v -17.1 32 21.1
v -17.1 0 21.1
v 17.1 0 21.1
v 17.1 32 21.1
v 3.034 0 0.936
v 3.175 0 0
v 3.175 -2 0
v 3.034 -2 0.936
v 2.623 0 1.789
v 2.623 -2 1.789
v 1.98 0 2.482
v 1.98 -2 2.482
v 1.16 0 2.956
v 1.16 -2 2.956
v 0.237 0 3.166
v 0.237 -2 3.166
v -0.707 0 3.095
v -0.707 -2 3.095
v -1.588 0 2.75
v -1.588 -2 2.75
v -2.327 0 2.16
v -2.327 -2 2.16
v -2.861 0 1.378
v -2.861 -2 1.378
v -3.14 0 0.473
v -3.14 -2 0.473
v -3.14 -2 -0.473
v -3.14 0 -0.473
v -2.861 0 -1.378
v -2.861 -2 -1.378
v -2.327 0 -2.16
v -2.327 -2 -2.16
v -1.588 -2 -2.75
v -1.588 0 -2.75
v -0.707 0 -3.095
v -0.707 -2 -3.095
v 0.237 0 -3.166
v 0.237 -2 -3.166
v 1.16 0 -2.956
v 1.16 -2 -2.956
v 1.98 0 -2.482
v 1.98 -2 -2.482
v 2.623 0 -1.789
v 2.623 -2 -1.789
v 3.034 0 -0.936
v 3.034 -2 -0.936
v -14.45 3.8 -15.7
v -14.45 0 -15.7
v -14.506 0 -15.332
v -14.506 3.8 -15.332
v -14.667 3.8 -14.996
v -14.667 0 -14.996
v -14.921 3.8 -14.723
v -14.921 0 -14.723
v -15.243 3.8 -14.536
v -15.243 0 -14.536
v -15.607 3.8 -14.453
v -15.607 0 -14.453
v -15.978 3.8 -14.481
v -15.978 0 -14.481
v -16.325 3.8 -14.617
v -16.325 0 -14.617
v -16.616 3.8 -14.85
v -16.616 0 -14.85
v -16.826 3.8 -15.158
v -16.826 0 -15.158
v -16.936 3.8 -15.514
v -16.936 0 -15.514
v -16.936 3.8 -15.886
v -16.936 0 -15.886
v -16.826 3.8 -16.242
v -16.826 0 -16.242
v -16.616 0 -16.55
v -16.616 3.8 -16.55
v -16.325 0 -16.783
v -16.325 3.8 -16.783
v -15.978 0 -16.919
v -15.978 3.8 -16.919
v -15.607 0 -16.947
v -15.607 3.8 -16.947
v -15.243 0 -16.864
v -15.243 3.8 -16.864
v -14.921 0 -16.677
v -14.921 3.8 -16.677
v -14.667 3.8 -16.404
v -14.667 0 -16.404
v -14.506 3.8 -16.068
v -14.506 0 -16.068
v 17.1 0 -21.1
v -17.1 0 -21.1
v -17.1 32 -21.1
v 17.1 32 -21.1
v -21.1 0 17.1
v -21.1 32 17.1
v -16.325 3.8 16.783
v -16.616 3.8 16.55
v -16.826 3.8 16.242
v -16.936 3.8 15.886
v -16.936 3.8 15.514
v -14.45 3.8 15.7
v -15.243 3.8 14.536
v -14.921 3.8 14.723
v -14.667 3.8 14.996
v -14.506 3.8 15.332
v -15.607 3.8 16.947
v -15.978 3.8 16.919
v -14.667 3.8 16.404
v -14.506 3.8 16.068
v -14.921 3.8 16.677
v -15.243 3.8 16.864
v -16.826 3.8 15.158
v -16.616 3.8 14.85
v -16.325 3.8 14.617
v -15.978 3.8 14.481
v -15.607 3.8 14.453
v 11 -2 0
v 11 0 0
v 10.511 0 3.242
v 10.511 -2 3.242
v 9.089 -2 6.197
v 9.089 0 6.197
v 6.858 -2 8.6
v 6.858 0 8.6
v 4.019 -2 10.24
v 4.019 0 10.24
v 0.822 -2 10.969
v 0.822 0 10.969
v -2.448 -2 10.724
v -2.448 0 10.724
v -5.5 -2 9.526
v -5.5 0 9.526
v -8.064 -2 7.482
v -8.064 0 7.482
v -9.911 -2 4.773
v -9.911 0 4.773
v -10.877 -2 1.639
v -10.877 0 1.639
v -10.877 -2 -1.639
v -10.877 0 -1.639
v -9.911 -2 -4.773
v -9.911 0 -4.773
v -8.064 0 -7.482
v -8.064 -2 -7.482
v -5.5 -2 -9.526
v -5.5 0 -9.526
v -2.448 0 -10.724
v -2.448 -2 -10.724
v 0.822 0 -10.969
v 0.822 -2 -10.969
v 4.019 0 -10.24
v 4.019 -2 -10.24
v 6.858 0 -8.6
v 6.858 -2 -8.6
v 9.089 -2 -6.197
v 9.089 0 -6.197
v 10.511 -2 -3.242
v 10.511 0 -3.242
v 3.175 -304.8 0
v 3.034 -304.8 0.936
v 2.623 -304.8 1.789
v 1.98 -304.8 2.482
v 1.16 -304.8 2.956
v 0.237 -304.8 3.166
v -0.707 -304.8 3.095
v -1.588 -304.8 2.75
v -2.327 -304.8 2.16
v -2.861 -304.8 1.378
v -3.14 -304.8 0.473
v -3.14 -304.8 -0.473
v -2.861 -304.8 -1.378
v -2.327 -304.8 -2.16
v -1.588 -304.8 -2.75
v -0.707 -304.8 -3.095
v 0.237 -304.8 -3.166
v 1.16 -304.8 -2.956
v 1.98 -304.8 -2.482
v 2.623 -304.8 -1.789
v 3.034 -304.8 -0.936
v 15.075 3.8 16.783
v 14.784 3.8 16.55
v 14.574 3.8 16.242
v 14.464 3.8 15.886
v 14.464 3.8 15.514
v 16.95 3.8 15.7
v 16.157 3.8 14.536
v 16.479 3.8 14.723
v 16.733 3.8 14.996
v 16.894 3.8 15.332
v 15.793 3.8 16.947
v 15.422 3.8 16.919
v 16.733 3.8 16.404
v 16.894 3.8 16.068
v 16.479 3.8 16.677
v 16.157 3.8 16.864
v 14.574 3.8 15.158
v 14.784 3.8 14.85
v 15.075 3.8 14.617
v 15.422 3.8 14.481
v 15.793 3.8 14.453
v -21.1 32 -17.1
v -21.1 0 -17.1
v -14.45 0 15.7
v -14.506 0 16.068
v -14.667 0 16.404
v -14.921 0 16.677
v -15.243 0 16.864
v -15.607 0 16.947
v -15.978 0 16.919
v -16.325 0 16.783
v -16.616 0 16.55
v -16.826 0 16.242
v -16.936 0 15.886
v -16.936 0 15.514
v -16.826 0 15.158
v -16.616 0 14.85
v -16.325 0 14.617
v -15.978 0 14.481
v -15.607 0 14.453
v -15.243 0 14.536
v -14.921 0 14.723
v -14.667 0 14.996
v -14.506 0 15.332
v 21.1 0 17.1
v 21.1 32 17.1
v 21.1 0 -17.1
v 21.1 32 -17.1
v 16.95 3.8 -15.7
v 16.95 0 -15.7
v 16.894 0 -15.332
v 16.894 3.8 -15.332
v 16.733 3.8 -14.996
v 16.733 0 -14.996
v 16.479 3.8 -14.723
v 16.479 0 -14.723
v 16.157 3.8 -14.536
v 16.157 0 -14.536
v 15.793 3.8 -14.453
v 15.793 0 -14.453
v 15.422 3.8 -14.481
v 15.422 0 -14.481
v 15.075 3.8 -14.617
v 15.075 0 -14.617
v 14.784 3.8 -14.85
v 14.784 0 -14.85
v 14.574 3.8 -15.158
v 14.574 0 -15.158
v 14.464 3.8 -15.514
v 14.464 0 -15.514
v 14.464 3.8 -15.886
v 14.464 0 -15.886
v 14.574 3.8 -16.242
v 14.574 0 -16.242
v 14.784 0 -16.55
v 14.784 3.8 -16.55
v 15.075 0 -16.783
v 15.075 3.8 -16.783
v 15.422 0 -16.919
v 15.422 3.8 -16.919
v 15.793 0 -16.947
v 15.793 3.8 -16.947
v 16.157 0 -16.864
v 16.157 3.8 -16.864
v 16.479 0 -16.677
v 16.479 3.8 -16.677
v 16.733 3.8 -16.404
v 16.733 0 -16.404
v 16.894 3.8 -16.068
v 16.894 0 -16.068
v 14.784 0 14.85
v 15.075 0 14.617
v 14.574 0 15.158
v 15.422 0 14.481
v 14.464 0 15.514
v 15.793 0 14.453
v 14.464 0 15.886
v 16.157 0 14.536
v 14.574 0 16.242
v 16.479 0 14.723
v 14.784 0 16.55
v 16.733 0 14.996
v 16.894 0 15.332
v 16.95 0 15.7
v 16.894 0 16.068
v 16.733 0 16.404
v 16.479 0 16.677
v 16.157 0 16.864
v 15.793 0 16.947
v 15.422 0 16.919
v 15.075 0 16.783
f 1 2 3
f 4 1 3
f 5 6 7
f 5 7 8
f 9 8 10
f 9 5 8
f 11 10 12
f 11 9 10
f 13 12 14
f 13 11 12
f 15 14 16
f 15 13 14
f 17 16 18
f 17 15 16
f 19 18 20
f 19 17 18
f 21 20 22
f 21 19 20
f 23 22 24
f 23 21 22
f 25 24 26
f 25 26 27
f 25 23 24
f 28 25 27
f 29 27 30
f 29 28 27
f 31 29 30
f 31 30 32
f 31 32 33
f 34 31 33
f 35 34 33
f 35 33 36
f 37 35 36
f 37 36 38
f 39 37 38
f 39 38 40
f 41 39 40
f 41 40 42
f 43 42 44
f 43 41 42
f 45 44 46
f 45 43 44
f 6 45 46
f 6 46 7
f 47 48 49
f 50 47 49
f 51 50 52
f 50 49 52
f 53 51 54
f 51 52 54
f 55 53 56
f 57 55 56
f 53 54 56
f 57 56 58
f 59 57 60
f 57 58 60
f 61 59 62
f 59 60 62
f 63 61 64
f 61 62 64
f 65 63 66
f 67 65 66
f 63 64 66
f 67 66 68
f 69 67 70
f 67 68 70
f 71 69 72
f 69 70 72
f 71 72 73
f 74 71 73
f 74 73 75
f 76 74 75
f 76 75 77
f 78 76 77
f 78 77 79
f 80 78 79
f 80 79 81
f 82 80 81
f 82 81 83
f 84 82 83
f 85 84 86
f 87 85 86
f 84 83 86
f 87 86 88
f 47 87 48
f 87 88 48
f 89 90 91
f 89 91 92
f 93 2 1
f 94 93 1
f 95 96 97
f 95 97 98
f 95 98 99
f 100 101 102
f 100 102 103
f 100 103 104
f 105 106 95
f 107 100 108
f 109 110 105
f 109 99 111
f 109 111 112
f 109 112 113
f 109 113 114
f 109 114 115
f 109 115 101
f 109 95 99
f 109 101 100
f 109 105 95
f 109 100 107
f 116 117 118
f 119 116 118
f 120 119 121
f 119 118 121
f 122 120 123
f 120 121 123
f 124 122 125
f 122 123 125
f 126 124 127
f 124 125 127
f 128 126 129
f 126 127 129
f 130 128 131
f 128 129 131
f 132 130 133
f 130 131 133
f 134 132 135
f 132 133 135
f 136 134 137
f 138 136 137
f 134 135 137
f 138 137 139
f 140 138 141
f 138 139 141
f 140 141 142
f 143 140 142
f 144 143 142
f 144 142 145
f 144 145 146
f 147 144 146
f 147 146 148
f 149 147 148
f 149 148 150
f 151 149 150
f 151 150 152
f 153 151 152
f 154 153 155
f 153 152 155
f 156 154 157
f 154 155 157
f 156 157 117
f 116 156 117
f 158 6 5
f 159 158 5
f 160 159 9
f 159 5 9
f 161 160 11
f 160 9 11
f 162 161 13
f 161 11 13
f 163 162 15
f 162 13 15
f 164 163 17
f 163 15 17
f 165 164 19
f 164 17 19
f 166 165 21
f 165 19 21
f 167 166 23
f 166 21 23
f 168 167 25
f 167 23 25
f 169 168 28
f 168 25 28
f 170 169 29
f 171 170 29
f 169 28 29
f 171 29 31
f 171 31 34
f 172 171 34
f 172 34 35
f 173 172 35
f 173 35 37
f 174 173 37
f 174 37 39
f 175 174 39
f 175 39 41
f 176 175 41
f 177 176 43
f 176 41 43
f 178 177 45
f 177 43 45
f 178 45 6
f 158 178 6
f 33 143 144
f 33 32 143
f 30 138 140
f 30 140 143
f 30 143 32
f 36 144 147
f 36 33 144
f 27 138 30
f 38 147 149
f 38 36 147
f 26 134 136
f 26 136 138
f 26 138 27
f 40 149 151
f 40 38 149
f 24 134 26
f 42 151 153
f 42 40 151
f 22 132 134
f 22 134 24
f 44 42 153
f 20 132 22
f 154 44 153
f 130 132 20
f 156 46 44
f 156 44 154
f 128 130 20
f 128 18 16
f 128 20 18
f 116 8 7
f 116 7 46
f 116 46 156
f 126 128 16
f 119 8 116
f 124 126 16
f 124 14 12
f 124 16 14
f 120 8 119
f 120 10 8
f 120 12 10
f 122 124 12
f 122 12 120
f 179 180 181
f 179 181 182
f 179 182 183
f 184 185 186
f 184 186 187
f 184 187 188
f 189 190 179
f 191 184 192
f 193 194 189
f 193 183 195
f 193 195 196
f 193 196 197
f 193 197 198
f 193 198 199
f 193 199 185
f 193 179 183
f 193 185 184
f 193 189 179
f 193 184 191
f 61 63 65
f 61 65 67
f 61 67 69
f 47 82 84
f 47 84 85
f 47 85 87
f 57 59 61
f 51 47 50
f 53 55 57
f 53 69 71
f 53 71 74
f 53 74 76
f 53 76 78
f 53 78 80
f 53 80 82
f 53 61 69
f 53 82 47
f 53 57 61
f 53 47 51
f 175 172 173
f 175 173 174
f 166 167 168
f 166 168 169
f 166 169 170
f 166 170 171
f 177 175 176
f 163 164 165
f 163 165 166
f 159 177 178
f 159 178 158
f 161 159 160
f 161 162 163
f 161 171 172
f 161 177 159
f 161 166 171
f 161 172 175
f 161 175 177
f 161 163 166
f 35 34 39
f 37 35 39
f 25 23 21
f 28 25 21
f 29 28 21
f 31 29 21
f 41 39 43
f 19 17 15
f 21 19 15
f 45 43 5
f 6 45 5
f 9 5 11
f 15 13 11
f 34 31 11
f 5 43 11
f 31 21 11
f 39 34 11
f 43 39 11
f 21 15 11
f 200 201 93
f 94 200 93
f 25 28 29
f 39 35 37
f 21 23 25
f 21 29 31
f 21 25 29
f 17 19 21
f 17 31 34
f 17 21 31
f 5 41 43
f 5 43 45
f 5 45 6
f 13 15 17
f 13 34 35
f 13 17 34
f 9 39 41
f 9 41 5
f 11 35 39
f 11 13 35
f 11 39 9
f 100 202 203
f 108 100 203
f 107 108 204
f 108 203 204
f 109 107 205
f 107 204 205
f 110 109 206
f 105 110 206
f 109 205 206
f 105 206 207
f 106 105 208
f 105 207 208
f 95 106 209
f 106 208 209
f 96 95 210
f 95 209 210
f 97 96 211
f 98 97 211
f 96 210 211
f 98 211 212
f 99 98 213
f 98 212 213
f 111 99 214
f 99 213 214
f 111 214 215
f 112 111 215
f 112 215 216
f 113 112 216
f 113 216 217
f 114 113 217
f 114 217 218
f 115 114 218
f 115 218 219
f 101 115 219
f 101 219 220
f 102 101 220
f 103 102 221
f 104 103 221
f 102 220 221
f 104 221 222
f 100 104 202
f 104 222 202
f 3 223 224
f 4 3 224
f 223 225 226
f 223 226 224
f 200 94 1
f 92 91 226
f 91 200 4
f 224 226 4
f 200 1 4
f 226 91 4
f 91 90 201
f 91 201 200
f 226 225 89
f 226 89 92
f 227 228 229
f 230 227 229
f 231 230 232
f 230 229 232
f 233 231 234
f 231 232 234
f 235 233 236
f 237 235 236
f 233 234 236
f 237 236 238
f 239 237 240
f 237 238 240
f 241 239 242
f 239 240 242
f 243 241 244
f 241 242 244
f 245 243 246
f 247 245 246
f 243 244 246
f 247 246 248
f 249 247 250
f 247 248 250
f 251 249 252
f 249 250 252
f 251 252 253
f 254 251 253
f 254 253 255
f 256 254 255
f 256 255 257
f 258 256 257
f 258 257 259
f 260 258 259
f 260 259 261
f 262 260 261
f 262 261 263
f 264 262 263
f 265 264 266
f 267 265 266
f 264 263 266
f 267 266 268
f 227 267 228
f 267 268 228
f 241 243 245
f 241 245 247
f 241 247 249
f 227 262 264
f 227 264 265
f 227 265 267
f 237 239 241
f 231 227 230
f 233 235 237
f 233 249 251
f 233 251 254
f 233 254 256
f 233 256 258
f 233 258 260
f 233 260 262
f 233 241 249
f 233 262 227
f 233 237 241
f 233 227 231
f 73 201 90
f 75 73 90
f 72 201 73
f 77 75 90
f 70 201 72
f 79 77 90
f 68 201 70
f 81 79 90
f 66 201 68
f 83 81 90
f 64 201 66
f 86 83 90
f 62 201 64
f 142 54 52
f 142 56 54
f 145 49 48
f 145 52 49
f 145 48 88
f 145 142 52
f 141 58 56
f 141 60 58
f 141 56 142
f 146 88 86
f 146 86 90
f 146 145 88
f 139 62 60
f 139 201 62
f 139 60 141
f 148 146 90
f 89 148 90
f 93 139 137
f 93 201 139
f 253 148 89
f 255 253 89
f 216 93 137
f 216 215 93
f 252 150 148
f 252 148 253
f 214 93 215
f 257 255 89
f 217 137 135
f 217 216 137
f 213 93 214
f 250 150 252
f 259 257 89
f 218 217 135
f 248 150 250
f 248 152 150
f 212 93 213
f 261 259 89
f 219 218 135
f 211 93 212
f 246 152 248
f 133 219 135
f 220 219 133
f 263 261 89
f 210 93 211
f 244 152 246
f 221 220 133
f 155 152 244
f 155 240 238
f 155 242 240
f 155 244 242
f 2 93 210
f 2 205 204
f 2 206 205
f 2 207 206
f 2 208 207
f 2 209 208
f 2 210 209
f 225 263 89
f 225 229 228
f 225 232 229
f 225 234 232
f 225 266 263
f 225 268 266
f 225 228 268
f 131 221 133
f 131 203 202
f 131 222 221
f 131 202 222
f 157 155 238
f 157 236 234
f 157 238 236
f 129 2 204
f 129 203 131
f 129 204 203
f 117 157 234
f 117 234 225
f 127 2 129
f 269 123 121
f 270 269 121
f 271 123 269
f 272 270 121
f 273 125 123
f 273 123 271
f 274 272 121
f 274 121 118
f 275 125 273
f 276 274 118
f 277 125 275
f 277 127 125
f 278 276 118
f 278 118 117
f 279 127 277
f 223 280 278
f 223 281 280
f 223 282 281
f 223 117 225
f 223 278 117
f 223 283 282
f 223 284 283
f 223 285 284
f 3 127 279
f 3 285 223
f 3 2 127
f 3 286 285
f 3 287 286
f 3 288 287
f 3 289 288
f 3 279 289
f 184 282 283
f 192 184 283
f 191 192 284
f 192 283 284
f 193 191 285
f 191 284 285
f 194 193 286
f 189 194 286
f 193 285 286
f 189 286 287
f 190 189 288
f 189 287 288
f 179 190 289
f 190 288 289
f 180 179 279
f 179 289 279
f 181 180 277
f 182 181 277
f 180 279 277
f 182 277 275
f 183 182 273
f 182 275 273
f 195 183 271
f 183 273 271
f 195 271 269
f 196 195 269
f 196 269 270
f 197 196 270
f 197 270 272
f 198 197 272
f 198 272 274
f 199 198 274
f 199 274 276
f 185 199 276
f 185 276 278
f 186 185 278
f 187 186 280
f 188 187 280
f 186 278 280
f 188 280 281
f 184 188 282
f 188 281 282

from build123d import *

# Parameters (mm, degrees)
F0_W     = 42.2
F0_H     = 42.2
F0_R     = 1.25
F0_R_2   = 11
F0_R_3   = 3.175
F1_DEPTH = 32
F2_DEPTH = 304.8
F3_DEPTH = 2
F4_DEPTH = 3.8
F5_SIZE  = 4


with BuildPart() as f1:
    # F0 (on Front) → F1 (new body)
    with BuildSketch(Plane.XZ):
        Rectangle(F0_W, F0_H)
        with Locations((-15.7, -15.7)):
            Circle(F0_R, mode=Mode.SUBTRACT)
        with Locations((15.7, -15.7)):
            Circle(F0_R, mode=Mode.SUBTRACT)
        with Locations((-15.7, 15.7)):
            Circle(F0_R, mode=Mode.SUBTRACT)
        Circle(F0_R_2, mode=Mode.SUBTRACT)
        with Locations((15.7, 15.7)):
            Circle(F0_R, mode=Mode.SUBTRACT)
        with Locations((15.7, 15.7)):
            Circle(F0_R)
        with Locations((15.7, -15.7)):
            Circle(F0_R)
        with Locations((-15.7, -15.7)):
            Circle(F0_R)
        with Locations((-15.7, 15.7)):
            Circle(F0_R)
        Circle(F0_R_2)
        Circle(F0_R_3, mode=Mode.SUBTRACT)
        Circle(F0_R_3)
    extrude(amount=-F1_DEPTH)

    # F0 (on Front) → F3 (join)
    with BuildSketch(Plane.XZ):
        Circle(F0_R_2)
        Circle(F0_R_3, mode=Mode.SUBTRACT)
    extrude(amount=F3_DEPTH)

    # F0 (on Front) → F4 (cut)
    with BuildSketch(Plane.XZ):
        with Locations((-15.7, 15.7)):
            Circle(F0_R)
        with Locations((15.7, 15.7)):
            Circle(F0_R)
        with Locations((15.7, -15.7)):
            Circle(F0_R)
        with Locations((-15.7, -15.7)):
            Circle(F0_R)
    extrude(amount=-F4_DEPTH, mode=Mode.SUBTRACT)

    # F5
    f5_edges = [f1.edges().sort_by_distance(p)[0] for p in [
        (-21.1, 16, 21.1),
        (21.1, 16, 21.1),
        (21.1, 16, -21.1),
        (-21.1, 16, -21.1),
    ]]
    chamfer(f5_edges, length=F5_SIZE)


with BuildPart() as f2:
    # F0 (on Front) → F2 (new body)
    with BuildSketch(Plane.XZ):
        Circle(F0_R_3)
    extrude(amount=F2_DEPTH)


solid = Compound([f1.part, f2.part])
